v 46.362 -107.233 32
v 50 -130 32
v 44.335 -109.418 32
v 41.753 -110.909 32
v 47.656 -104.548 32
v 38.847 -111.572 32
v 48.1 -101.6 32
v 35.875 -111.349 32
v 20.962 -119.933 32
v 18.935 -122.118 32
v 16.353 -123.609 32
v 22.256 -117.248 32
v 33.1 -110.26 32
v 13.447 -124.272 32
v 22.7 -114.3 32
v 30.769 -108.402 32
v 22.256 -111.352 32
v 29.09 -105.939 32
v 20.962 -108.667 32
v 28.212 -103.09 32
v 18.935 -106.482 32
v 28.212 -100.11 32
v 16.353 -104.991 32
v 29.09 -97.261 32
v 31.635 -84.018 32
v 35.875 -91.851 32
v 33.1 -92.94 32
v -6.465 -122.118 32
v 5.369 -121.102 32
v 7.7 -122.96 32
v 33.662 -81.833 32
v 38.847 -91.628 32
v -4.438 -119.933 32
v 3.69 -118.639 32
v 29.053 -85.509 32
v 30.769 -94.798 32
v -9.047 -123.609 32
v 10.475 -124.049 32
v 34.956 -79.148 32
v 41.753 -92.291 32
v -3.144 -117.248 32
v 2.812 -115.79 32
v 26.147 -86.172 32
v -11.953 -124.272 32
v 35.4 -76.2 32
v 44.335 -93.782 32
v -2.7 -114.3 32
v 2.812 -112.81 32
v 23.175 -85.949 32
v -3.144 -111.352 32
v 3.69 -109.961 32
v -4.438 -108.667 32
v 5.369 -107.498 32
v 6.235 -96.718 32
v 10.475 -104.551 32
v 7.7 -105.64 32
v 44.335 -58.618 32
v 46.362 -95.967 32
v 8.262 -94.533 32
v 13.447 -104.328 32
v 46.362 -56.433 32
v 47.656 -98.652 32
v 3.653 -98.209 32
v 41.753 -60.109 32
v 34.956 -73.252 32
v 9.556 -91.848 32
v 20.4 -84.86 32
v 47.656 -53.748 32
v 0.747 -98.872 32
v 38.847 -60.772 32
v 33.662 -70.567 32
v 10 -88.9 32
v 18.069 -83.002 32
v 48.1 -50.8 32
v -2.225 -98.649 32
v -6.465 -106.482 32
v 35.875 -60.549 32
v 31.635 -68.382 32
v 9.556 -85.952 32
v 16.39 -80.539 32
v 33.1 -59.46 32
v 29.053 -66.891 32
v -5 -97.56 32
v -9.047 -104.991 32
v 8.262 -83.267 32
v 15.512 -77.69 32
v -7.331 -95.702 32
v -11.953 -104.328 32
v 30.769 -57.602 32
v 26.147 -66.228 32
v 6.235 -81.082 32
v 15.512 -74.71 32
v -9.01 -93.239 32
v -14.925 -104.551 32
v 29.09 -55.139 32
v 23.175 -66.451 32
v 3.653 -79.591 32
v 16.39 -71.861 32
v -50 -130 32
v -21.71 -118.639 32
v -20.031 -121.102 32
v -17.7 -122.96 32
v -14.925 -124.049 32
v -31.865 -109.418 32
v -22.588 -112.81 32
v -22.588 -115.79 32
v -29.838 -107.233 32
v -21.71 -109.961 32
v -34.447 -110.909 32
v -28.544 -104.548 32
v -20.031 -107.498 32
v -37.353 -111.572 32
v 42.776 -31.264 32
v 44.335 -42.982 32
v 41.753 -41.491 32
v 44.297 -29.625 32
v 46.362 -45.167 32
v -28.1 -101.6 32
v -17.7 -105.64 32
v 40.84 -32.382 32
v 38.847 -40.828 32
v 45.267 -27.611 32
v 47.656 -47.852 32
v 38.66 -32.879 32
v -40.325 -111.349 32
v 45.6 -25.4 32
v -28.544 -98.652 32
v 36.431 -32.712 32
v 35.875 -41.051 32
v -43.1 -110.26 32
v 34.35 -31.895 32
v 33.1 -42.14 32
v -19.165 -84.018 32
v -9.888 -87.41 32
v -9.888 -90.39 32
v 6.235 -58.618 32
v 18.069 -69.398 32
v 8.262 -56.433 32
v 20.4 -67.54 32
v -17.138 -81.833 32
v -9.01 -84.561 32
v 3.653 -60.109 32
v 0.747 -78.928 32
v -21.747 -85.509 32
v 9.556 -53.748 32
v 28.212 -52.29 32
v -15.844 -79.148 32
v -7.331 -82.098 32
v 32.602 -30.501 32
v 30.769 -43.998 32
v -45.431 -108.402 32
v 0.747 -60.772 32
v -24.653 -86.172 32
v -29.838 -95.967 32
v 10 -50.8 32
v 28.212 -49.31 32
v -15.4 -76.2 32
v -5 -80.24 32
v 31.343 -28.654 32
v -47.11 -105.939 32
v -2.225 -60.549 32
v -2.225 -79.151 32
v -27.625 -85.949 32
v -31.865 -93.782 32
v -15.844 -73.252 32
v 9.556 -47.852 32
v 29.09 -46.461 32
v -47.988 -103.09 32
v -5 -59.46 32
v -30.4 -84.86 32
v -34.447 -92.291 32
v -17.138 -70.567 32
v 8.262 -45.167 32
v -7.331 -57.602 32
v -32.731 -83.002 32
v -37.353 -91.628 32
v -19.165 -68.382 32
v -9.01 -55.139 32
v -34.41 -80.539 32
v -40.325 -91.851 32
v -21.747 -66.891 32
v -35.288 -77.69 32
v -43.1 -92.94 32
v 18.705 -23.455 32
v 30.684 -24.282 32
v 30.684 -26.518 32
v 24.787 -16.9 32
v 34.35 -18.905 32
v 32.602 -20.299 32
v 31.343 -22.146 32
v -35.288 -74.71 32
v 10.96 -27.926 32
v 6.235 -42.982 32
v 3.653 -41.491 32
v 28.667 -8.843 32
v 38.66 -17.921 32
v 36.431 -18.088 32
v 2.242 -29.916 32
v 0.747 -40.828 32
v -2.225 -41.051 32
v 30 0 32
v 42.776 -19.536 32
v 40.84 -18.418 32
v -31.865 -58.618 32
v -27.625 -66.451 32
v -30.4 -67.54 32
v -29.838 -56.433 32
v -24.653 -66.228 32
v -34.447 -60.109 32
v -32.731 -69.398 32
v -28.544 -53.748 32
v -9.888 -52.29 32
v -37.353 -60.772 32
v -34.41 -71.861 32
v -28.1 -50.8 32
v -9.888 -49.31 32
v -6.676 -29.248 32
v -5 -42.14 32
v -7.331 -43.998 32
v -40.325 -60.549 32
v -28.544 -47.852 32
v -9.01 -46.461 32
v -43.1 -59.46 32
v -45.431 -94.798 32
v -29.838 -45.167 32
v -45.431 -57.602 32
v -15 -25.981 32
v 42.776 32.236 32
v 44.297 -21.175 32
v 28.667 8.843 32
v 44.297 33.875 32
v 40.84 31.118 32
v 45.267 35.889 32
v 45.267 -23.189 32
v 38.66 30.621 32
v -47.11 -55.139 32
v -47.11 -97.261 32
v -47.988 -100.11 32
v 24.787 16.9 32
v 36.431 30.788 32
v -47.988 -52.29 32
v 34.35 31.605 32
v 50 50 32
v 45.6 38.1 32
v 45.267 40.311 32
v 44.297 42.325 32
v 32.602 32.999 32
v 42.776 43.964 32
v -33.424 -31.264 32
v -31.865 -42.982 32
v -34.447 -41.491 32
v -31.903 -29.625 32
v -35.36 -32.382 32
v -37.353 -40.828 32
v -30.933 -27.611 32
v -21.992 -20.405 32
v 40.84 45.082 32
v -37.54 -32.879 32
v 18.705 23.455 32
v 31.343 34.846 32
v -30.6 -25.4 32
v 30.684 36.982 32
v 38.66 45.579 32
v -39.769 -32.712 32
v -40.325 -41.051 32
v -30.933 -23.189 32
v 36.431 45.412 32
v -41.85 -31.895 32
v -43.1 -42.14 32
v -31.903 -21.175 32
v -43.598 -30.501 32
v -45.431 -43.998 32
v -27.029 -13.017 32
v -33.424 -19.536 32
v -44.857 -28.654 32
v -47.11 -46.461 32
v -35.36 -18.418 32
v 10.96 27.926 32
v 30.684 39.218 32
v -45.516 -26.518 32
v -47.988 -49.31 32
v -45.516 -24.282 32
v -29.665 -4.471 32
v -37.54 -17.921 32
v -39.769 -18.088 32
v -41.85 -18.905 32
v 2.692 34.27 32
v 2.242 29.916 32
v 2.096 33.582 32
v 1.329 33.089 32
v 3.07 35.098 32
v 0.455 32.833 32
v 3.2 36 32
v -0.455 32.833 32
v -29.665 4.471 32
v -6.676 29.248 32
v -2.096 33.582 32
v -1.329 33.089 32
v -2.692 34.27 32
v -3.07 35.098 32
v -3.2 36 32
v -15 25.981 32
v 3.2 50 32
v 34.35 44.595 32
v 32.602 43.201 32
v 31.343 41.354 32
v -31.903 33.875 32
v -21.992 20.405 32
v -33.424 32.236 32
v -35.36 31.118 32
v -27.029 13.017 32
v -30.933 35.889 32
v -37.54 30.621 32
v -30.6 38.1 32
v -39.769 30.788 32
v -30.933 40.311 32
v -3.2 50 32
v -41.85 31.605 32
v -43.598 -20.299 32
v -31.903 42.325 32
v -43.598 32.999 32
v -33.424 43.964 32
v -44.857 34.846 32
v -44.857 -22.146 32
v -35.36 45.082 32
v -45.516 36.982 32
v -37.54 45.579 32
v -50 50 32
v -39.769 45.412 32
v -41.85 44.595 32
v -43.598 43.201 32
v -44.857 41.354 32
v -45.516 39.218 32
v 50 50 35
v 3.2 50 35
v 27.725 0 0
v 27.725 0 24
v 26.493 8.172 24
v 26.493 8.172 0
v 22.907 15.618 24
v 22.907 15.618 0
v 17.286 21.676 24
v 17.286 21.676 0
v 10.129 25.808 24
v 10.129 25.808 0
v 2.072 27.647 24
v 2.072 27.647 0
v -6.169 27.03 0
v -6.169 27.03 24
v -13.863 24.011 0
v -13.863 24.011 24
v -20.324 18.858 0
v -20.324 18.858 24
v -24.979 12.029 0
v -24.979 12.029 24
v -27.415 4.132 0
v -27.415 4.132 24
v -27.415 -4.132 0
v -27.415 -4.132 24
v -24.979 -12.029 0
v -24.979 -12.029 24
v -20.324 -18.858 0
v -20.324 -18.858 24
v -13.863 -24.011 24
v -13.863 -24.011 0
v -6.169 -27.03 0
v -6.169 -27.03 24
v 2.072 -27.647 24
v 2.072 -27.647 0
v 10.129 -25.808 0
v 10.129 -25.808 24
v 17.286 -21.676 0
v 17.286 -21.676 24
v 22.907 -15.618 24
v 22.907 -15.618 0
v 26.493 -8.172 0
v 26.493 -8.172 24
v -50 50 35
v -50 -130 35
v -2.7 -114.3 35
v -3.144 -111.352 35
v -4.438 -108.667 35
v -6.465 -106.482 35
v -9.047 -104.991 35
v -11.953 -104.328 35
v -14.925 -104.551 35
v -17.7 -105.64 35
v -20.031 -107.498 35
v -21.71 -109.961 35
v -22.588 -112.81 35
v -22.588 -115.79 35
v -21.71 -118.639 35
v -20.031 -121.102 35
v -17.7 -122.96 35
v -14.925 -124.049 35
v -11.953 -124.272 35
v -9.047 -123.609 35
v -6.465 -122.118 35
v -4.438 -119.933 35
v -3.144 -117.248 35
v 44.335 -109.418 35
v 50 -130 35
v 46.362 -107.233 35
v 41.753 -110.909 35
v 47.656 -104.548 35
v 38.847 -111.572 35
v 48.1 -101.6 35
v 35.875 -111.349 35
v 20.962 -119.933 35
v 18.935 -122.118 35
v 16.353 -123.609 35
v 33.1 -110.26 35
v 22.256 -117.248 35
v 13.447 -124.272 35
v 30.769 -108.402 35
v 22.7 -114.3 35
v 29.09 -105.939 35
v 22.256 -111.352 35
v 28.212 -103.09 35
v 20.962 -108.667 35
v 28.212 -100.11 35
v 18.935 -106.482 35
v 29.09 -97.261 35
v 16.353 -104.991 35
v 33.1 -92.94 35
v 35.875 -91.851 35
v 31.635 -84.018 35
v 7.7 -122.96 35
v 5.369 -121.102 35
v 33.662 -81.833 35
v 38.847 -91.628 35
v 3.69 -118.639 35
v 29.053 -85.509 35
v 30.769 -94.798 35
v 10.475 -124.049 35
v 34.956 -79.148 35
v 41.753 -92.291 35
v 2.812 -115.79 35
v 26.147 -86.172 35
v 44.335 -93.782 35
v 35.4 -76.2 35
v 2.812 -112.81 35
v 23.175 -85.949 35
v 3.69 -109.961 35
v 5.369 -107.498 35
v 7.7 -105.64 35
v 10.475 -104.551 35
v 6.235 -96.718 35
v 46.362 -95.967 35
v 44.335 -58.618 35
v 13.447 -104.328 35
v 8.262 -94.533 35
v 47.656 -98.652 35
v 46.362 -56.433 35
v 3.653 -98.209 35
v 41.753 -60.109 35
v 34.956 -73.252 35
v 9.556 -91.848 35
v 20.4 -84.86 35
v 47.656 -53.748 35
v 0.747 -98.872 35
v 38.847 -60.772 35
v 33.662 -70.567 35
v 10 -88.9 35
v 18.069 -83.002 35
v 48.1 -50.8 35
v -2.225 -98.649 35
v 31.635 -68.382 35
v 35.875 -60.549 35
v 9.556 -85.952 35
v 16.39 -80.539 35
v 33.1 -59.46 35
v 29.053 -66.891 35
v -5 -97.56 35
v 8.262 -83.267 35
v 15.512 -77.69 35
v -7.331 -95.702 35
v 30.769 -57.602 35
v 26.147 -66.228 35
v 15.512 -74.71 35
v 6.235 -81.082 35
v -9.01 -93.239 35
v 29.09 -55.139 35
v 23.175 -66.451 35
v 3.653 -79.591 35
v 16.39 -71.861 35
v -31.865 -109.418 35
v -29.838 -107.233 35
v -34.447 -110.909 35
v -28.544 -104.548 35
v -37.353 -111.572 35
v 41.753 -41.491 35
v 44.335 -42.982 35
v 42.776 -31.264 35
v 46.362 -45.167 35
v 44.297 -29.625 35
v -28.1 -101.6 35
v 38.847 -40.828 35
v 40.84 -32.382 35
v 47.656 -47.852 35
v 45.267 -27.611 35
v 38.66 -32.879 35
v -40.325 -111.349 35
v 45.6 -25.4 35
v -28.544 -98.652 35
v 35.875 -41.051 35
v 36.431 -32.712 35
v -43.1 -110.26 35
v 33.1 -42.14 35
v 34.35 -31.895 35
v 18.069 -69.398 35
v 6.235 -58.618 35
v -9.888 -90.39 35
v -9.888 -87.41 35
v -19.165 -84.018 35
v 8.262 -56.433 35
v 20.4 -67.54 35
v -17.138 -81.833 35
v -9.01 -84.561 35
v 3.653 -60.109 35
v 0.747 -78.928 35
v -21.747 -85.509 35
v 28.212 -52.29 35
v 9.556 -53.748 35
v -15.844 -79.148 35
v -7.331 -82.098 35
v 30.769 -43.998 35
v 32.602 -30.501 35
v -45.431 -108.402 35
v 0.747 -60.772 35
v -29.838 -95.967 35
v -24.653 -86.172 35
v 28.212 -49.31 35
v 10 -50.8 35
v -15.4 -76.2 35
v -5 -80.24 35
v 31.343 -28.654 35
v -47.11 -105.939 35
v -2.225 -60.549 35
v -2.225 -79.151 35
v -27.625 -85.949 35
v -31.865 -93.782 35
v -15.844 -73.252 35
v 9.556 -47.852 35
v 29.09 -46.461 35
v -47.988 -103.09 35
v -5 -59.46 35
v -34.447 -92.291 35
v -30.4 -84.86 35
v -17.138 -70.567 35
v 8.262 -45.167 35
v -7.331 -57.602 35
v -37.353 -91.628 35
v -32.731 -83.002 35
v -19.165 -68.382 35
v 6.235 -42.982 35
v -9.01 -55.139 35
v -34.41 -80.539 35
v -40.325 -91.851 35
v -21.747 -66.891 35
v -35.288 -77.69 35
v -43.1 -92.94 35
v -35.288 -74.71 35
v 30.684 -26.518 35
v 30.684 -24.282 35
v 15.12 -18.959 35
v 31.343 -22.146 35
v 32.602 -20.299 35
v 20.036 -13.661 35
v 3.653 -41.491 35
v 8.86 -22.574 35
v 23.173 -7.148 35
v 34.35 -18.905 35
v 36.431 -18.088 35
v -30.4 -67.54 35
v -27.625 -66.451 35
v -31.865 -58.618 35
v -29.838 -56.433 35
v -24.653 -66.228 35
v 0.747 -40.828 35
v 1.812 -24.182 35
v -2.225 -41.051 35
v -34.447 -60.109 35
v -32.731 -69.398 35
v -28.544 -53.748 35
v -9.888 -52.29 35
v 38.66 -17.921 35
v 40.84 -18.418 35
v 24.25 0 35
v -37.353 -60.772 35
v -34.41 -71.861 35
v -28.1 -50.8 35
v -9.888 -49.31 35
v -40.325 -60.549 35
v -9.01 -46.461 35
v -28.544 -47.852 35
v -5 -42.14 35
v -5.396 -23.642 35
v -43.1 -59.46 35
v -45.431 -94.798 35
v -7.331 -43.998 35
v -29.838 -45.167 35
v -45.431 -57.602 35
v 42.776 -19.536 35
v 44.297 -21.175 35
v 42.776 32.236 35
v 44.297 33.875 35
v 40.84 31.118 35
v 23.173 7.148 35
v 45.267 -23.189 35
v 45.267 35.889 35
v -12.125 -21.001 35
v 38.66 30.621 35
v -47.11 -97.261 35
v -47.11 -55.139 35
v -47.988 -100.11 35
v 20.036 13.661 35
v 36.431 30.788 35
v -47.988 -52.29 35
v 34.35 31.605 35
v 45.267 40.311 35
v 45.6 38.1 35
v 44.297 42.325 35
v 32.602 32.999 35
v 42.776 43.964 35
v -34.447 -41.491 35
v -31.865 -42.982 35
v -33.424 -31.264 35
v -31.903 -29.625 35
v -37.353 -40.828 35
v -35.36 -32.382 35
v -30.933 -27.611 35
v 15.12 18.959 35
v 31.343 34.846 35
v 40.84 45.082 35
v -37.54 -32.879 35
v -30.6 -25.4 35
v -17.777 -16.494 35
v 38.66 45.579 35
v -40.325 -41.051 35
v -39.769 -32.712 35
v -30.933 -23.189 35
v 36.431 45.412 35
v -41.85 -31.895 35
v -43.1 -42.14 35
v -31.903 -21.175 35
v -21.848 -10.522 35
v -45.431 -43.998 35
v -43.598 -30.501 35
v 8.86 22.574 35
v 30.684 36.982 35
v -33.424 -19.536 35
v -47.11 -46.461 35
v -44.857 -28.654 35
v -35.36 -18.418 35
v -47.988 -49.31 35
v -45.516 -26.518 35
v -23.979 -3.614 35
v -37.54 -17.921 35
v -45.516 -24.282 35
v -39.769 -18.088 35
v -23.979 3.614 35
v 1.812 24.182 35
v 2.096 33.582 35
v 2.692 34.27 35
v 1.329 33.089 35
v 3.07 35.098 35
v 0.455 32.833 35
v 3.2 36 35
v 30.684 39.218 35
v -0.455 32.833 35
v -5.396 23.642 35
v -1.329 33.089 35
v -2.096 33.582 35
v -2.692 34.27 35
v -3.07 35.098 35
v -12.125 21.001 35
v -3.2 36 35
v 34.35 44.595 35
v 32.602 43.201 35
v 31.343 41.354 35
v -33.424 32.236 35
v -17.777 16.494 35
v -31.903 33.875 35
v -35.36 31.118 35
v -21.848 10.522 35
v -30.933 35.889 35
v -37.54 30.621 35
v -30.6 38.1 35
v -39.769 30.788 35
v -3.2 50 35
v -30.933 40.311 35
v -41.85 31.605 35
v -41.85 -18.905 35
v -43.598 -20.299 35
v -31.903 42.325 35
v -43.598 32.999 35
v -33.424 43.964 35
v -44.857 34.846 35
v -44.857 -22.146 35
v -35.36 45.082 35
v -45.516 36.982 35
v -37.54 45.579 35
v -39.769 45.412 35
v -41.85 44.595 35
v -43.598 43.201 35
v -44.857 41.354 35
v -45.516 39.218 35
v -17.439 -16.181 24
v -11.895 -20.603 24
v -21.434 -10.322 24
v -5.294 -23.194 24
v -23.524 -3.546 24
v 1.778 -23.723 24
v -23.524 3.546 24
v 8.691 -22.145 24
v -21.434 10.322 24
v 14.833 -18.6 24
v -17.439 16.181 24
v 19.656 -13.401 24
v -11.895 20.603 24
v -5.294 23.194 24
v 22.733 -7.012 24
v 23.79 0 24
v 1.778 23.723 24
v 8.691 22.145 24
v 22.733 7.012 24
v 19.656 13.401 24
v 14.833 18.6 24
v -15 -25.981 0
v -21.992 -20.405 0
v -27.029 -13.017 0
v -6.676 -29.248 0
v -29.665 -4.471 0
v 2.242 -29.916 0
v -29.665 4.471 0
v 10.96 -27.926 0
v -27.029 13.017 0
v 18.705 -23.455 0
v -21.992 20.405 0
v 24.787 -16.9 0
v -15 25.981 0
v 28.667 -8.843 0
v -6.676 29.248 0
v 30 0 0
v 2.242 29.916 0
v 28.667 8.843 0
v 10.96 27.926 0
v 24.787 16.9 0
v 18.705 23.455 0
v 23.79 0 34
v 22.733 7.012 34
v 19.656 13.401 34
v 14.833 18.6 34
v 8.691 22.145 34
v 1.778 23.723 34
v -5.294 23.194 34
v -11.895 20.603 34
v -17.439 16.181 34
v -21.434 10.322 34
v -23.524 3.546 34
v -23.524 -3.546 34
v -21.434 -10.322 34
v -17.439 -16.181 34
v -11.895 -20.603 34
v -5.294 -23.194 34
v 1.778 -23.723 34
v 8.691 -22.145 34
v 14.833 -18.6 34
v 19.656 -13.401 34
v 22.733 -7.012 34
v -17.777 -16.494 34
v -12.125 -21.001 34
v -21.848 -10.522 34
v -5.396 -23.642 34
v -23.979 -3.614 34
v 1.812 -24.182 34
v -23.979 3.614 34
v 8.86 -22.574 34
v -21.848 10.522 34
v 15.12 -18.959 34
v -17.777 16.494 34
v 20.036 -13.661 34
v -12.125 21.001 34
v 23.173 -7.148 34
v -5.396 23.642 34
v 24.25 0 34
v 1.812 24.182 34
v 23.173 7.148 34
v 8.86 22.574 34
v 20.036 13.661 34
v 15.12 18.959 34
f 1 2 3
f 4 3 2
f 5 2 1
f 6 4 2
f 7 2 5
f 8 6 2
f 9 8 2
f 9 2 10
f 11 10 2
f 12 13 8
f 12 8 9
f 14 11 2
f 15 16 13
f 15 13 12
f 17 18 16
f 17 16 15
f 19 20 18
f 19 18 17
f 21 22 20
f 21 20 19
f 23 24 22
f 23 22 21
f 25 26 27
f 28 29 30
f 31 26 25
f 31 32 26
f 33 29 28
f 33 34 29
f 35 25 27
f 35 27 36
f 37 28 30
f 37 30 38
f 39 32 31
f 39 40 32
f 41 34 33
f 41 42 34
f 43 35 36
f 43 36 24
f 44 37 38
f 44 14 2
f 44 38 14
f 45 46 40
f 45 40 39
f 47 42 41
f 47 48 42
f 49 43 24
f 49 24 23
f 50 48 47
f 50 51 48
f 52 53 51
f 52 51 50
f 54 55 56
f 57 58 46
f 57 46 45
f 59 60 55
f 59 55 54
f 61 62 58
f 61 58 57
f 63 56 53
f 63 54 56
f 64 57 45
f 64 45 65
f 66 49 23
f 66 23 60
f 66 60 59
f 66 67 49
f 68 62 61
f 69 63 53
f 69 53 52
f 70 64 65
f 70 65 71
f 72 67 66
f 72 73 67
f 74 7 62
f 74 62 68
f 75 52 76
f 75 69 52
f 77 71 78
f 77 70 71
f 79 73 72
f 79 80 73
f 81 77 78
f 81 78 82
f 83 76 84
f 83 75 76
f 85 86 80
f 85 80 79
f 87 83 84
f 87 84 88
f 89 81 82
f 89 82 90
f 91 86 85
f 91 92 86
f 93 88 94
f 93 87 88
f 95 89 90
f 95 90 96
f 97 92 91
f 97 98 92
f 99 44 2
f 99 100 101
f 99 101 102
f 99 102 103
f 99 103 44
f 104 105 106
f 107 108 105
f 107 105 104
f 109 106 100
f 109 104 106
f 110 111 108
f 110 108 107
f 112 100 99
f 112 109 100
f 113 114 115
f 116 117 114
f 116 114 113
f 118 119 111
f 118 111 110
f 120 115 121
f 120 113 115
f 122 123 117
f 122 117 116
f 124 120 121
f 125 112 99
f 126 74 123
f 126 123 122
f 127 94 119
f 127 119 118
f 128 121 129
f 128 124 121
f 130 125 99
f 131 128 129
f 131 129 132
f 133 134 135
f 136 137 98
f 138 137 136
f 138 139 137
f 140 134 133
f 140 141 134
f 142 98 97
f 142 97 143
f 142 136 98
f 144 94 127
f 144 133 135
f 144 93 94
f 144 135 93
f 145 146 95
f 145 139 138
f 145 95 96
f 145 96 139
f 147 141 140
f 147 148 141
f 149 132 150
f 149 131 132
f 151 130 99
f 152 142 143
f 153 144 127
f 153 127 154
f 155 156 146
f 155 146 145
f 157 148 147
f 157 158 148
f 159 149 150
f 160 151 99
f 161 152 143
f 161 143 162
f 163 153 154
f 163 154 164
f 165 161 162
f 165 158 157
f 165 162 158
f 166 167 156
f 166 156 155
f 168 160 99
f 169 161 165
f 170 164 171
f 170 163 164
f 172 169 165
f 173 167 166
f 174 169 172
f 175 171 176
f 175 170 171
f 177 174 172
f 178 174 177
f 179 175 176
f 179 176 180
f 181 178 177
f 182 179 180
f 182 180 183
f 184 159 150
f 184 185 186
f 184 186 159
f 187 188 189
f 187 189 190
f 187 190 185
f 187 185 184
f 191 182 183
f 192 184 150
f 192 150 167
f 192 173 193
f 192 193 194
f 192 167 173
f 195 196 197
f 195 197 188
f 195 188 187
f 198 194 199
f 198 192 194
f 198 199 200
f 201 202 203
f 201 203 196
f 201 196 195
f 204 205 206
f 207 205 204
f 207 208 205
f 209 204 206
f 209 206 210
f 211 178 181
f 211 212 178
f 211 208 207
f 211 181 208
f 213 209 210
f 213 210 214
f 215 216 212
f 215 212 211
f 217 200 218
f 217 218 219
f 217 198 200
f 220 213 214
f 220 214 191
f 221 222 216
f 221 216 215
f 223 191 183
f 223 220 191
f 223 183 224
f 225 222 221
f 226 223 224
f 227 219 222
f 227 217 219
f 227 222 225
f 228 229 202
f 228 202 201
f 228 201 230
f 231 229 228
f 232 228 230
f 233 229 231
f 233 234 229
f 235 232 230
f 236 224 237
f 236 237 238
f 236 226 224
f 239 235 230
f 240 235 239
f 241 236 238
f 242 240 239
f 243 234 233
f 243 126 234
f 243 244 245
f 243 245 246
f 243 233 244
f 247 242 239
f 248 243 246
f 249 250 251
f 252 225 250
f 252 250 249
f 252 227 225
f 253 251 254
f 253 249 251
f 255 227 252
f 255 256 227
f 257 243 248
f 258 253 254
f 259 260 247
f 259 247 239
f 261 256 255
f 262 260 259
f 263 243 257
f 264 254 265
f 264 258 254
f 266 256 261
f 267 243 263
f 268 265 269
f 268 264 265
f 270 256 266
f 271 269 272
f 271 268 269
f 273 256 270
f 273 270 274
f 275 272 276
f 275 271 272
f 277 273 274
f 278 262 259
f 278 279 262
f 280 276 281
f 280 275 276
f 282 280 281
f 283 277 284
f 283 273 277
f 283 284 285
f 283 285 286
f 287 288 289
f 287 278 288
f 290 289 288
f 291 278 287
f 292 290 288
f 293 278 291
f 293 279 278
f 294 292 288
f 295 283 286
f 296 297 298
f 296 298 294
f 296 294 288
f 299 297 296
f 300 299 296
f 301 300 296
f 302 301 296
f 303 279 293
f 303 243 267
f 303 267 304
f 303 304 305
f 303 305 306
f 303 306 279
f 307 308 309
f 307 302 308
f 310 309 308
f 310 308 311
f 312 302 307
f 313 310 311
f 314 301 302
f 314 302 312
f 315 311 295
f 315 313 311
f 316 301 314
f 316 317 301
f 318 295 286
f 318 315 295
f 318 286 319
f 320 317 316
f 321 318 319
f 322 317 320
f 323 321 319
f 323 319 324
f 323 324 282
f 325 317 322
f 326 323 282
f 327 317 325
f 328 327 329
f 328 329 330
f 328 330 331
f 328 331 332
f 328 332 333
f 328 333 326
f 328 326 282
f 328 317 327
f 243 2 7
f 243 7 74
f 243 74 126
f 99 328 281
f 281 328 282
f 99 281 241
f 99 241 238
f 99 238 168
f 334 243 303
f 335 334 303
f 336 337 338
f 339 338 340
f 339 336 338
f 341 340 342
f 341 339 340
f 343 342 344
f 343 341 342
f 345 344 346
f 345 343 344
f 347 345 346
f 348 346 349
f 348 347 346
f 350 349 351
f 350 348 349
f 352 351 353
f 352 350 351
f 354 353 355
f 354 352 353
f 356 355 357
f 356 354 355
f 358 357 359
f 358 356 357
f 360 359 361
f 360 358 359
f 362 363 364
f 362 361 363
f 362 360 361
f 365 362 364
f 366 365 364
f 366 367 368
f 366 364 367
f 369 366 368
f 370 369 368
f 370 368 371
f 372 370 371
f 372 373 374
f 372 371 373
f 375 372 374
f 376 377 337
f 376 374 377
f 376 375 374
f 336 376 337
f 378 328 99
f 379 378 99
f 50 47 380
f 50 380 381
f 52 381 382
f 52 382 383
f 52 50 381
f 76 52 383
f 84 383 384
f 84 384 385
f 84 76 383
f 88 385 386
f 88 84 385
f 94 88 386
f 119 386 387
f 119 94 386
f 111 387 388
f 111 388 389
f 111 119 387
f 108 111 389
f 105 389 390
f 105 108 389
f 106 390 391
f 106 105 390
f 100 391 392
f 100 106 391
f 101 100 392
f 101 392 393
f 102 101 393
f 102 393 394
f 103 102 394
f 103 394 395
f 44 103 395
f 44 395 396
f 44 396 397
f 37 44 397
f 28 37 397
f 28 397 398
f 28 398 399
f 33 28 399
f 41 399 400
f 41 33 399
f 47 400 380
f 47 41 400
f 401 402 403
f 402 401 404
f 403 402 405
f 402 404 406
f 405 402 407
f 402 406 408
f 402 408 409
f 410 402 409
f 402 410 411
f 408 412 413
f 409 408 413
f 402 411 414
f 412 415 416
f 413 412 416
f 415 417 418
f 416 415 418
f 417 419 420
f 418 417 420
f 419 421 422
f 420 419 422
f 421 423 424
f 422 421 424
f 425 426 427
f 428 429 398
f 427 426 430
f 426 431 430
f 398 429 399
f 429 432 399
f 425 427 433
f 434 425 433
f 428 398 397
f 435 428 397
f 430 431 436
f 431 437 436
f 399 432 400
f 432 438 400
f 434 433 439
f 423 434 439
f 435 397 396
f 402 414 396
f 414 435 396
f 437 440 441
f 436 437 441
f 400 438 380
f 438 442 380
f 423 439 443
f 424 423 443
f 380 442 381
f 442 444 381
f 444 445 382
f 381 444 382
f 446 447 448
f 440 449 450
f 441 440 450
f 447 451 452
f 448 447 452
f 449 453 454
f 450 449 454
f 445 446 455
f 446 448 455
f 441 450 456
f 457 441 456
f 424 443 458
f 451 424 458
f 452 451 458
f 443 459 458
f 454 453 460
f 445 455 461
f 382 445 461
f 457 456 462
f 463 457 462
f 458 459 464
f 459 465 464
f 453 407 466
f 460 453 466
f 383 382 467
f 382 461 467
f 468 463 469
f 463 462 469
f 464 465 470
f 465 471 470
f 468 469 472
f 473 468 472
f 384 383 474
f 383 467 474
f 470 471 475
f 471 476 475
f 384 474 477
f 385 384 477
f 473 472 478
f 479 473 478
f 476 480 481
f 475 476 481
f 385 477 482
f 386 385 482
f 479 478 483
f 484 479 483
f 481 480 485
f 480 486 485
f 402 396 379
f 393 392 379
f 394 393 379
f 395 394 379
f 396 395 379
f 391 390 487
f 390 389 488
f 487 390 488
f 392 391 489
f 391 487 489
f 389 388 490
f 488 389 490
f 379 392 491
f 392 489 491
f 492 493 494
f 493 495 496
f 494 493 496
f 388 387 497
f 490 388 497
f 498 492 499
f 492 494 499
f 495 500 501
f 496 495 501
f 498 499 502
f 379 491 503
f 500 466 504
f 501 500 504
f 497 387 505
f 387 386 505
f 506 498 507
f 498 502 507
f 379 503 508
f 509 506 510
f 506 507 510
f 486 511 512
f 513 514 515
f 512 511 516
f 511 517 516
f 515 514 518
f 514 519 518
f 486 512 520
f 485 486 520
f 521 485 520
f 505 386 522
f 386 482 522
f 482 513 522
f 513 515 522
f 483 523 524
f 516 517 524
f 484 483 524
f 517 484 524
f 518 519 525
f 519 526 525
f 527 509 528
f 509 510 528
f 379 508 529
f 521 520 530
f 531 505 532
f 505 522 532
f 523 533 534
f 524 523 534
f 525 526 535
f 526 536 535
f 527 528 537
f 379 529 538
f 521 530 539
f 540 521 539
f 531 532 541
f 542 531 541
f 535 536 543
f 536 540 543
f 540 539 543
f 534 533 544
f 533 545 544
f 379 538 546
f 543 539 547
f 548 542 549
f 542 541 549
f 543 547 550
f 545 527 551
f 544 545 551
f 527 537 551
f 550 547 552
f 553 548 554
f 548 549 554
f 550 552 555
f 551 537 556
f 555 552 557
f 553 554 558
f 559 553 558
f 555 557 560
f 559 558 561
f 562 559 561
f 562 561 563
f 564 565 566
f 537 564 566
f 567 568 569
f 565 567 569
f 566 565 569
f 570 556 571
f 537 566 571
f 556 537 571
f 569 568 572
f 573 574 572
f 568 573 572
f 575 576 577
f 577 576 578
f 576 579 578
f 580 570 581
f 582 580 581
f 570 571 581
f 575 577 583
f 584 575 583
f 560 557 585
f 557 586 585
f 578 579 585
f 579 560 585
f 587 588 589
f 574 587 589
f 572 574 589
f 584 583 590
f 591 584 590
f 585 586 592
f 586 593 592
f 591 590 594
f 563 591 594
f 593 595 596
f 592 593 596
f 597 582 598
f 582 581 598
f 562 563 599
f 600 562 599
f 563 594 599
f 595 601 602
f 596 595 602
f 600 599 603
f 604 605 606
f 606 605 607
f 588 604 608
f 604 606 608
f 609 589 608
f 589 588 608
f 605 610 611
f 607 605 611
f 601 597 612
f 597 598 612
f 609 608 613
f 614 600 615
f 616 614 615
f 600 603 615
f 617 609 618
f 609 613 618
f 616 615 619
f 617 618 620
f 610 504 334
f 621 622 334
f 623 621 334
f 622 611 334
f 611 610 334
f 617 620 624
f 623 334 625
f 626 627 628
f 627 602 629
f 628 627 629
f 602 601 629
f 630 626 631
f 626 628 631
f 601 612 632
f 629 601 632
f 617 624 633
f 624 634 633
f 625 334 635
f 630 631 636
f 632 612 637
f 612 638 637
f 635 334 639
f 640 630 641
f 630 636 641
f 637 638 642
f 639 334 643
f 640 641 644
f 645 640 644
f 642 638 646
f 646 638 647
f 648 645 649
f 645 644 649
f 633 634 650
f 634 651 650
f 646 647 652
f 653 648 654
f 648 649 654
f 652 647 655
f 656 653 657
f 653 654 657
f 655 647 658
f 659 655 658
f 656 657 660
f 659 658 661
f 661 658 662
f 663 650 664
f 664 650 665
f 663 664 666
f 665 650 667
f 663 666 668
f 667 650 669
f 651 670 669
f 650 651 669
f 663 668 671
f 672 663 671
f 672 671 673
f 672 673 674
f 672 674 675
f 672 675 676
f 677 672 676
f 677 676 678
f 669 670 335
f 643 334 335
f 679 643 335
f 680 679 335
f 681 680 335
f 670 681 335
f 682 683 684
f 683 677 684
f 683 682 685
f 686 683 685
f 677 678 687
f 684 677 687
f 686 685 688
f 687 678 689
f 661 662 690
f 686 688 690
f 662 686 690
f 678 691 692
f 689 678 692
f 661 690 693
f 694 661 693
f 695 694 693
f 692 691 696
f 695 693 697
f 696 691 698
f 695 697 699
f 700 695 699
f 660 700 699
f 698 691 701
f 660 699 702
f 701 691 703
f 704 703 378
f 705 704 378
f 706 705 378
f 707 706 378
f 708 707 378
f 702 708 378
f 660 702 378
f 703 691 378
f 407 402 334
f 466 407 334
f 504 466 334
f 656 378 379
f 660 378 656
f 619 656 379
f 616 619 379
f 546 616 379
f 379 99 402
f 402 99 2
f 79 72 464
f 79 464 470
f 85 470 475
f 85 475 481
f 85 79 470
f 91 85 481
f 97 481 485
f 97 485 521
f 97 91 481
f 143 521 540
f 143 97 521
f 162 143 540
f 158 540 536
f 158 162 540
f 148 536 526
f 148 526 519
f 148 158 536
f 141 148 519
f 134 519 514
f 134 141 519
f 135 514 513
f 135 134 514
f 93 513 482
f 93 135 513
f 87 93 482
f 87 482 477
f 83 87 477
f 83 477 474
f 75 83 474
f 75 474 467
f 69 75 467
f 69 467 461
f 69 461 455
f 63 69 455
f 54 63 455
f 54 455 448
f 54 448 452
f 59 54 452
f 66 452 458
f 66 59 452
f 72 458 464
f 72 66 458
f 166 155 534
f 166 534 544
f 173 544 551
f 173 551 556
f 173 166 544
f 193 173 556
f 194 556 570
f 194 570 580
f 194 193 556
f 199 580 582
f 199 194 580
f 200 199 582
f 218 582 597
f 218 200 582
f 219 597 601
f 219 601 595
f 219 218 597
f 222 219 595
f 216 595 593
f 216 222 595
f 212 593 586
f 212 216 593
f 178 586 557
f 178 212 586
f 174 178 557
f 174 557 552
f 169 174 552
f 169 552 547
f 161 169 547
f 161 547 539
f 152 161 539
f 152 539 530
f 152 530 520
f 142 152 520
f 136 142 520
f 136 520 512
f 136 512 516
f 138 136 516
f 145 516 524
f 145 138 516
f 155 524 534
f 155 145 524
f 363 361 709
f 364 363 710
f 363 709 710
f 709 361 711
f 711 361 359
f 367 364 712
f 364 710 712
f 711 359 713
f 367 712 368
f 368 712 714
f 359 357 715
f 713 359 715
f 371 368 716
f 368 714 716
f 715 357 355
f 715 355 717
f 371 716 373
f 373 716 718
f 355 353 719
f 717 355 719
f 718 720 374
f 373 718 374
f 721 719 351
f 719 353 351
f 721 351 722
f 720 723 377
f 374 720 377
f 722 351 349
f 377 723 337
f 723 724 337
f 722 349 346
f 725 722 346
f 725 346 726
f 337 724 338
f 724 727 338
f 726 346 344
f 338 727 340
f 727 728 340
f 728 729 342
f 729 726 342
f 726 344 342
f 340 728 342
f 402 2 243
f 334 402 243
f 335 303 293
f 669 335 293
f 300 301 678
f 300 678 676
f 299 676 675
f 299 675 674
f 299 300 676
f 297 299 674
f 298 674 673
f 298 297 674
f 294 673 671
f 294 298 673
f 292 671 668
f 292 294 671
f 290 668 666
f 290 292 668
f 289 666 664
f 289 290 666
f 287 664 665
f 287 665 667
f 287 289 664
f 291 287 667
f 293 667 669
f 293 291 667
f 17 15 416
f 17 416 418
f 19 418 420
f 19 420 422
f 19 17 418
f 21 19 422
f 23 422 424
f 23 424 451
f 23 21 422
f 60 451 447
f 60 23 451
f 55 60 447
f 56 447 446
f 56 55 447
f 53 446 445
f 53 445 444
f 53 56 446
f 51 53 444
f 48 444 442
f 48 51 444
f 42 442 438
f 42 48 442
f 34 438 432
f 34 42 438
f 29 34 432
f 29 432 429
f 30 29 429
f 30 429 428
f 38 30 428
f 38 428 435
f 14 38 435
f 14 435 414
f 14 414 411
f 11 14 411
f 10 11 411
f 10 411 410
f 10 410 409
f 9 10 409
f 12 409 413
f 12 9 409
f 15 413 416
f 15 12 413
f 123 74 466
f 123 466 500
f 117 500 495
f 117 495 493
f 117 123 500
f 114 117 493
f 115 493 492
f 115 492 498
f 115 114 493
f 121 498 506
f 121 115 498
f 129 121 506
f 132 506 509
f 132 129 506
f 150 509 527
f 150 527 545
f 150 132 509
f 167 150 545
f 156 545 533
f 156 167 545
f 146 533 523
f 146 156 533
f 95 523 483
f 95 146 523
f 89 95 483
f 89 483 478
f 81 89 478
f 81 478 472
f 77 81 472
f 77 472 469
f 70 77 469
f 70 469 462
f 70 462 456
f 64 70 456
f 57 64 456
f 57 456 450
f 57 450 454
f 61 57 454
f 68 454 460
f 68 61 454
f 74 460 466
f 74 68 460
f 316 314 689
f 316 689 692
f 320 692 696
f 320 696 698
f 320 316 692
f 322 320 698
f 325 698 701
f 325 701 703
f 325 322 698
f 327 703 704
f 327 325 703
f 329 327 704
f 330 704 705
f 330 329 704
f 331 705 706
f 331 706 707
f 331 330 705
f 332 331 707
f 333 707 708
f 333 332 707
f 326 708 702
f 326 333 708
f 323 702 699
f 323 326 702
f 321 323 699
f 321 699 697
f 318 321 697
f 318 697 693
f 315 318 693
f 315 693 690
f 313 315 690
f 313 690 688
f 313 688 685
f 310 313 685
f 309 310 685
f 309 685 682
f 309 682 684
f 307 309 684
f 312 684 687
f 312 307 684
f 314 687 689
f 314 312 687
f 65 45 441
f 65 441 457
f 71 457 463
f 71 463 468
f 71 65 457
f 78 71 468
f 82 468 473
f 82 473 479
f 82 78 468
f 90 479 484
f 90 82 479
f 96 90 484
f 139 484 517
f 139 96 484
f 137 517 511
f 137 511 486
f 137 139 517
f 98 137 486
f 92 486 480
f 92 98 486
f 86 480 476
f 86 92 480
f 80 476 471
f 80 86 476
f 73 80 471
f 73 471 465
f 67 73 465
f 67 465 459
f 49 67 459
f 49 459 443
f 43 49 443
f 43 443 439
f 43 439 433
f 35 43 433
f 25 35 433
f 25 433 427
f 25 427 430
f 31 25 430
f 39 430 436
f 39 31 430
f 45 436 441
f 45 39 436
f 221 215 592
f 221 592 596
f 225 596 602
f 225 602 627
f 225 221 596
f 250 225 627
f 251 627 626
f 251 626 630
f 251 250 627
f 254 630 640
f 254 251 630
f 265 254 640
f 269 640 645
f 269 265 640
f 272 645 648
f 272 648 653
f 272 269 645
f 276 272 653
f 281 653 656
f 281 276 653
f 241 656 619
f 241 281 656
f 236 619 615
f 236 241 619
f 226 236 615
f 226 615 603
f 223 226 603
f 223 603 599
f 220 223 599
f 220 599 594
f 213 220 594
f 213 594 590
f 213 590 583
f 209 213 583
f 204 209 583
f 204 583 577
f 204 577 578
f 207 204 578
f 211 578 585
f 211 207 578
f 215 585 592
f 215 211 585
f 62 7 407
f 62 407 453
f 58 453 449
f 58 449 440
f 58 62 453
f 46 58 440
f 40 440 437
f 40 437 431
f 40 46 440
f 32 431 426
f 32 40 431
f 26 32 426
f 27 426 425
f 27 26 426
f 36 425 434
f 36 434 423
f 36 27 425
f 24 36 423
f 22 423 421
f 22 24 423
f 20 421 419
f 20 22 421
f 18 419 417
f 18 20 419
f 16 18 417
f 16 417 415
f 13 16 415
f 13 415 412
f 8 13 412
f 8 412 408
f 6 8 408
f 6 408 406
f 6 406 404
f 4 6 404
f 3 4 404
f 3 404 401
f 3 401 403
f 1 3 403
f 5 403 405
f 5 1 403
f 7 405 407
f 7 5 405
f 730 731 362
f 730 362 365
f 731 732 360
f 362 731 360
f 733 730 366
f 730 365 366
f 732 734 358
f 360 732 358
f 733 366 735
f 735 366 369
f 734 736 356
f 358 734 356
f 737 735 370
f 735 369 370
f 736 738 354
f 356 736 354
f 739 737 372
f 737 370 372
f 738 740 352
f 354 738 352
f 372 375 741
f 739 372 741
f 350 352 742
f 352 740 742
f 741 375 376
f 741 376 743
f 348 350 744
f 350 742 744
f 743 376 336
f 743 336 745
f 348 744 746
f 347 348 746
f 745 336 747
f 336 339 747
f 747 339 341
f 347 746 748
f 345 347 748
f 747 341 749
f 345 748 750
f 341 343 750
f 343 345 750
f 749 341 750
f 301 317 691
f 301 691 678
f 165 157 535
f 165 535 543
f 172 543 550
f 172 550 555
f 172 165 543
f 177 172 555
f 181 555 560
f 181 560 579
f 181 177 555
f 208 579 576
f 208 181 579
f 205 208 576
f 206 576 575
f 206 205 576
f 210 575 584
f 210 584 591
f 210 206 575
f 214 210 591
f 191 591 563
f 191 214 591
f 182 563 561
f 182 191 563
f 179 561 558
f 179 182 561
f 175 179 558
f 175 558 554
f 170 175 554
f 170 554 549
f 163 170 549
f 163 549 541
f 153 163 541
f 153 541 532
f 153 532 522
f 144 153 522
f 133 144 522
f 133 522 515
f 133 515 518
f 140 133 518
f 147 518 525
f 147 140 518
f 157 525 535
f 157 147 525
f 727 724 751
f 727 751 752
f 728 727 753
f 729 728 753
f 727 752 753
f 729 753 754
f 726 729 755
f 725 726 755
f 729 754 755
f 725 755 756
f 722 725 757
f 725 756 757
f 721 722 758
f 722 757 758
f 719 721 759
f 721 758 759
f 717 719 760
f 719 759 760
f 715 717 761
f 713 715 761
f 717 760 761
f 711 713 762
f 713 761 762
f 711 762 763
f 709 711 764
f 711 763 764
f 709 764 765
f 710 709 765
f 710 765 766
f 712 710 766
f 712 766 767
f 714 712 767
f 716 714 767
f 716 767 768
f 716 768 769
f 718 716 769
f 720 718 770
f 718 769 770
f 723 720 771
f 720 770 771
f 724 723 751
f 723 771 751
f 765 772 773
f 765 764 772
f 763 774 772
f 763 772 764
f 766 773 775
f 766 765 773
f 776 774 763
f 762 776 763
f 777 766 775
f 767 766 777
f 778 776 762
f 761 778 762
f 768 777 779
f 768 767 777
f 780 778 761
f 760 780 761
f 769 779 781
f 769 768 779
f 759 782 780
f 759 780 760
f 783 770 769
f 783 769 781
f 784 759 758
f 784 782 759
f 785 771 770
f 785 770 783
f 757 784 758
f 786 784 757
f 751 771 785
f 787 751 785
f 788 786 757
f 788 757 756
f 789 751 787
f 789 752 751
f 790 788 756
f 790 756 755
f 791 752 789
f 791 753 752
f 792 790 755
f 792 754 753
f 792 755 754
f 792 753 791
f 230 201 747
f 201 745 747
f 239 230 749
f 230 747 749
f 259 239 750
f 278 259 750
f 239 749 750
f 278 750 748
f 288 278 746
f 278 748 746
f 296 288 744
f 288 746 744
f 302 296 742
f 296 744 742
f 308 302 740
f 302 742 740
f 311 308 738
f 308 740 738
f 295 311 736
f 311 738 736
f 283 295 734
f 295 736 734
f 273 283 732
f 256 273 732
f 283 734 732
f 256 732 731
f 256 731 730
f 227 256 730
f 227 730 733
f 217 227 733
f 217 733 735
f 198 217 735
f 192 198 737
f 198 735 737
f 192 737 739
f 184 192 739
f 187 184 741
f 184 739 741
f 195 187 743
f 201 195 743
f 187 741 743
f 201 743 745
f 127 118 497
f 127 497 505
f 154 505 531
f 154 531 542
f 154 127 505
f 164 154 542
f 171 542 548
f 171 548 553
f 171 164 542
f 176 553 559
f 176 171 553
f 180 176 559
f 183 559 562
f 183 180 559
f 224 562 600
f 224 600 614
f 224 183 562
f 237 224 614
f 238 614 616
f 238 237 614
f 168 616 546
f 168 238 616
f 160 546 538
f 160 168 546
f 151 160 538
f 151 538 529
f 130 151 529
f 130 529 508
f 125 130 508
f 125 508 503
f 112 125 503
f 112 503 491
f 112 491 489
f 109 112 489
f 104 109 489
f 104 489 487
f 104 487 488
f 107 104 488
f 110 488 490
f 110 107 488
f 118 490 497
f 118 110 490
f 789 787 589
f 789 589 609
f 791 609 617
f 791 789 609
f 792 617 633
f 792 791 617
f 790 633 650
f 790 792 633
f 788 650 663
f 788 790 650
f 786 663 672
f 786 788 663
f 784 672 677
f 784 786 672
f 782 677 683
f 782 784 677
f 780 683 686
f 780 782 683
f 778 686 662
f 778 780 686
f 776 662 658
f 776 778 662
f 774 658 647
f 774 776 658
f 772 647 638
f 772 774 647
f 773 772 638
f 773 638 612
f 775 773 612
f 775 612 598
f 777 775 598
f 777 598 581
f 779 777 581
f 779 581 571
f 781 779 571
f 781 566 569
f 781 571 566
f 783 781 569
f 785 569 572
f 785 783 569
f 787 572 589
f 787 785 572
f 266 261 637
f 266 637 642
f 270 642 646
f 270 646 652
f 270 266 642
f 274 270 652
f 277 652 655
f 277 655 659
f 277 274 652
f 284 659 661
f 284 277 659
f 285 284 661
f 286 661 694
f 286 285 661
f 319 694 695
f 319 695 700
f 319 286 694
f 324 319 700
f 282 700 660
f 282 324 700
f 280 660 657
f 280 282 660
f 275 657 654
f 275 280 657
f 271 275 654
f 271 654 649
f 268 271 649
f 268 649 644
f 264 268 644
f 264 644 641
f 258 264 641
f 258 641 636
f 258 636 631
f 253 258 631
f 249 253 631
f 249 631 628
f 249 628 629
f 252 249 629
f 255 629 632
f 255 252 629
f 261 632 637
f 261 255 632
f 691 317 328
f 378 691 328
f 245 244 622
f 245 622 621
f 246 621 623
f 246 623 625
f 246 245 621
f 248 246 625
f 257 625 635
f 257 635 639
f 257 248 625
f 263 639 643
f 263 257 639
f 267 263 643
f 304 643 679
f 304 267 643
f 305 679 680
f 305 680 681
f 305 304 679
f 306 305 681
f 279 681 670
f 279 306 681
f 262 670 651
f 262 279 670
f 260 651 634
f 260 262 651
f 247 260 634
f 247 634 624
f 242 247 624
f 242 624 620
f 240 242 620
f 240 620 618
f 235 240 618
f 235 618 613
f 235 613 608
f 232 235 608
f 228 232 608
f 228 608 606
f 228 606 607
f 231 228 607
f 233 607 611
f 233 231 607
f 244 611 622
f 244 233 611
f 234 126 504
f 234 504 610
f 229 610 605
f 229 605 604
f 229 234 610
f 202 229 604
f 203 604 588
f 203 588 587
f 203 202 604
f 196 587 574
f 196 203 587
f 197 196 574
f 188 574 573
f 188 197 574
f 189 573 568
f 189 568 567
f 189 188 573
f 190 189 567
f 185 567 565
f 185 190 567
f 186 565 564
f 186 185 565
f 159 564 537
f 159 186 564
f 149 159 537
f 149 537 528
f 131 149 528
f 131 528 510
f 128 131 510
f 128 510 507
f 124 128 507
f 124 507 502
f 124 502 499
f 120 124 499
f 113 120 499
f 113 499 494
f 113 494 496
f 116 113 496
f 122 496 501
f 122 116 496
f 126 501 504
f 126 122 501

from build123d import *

# Parameters (mm, degrees)
SKETCH_R      = 30
SKETCH_R_2    = 27.725
PAD_DEPTH     = 32
SKETCH001_R   = 10
SKETCH001_R_2 = 7.5
PAD001_DEPTH  = 3
SKETCH002_R   = 24.25
POCKET_DEPTH  = 35.001
SKETCH003_R   = 30
SKETCH003_R_2 = 23.79
PAD002_DEPTH  = 10


with BuildPart() as part:
    # Sketch → Pad (new body)
    with BuildSketch(Plane.XY):
        Circle(SKETCH_R)
        Circle(SKETCH_R_2, mode=Mode.SUBTRACT)
    extrude(amount=PAD_DEPTH)

    # Sketch001 (on Face4 of Pad) → Pad001 (join)
    with BuildSketch(Plane.XY.offset(32)):
        with BuildLine():
            ThreePointArc((-3.2, 36), (0, 32.8), (3.2, 36))
            Line((3.2, 50), (3.2, 36))
            Line((50, 50), (3.2, 50))
            Line((50, -130), (50, 50))
            Line((-50, -130), (50, -130))
            Line((-50, 50), (-50, -130))
            Line((-3.2, 50), (-50, 50))
            Line((-3.2, 50), (-3.2, 36))
        make_face()
        with Locations((0, -50.8)):
            Circle(SKETCH001_R, mode=Mode.SUBTRACT)
        with Locations((-38.1, -50.8)):
            Circle(SKETCH001_R, mode=Mode.SUBTRACT)
        with Locations((38.1, -50.8)):
            Circle(SKETCH001_R, mode=Mode.SUBTRACT)
        with Locations((-25.4, -76.2)):
            Circle(SKETCH001_R, mode=Mode.SUBTRACT)
        with Locations((25.4, -76.2)):
            Circle(SKETCH001_R, mode=Mode.SUBTRACT)
        with Locations((0, -88.9)):
            Circle(SKETCH001_R, mode=Mode.SUBTRACT)
        with Locations((-38.1, -101.6)):
            Circle(SKETCH001_R, mode=Mode.SUBTRACT)
        with Locations((38.1, -101.6)):
            Circle(SKETCH001_R, mode=Mode.SUBTRACT)
        with Locations((-12.7, -114.3)):
            Circle(SKETCH001_R, mode=Mode.SUBTRACT)
        with Locations((12.7, -114.3)):
            Circle(SKETCH001_R, mode=Mode.SUBTRACT)
        with Locations((-38.1, 38.1)):
            Circle(SKETCH001_R_2, mode=Mode.SUBTRACT)
        with Locations((38.1, 38.1)):
            Circle(SKETCH001_R_2, mode=Mode.SUBTRACT)
        with Locations((38.1, -25.4)):
            Circle(SKETCH001_R_2, mode=Mode.SUBTRACT)
        with Locations((-38.1, -25.4)):
            Circle(SKETCH001_R_2, mode=Mode.SUBTRACT)
    extrude(amount=PAD001_DEPTH)

    # Sketch002 → Pocket (cut, through all)
    with BuildSketch(Plane.XY):
        Circle(SKETCH002_R)
    extrude(amount=POCKET_DEPTH, mode=Mode.SUBTRACT)

    # Sketch003 → Pad002 (join)
    with BuildSketch(Plane.XY.offset(34)):
        Circle(SKETCH003_R)
        Circle(SKETCH003_R_2, mode=Mode.SUBTRACT)
    extrude(amount=-PAD002_DEPTH)


solid = part.part
